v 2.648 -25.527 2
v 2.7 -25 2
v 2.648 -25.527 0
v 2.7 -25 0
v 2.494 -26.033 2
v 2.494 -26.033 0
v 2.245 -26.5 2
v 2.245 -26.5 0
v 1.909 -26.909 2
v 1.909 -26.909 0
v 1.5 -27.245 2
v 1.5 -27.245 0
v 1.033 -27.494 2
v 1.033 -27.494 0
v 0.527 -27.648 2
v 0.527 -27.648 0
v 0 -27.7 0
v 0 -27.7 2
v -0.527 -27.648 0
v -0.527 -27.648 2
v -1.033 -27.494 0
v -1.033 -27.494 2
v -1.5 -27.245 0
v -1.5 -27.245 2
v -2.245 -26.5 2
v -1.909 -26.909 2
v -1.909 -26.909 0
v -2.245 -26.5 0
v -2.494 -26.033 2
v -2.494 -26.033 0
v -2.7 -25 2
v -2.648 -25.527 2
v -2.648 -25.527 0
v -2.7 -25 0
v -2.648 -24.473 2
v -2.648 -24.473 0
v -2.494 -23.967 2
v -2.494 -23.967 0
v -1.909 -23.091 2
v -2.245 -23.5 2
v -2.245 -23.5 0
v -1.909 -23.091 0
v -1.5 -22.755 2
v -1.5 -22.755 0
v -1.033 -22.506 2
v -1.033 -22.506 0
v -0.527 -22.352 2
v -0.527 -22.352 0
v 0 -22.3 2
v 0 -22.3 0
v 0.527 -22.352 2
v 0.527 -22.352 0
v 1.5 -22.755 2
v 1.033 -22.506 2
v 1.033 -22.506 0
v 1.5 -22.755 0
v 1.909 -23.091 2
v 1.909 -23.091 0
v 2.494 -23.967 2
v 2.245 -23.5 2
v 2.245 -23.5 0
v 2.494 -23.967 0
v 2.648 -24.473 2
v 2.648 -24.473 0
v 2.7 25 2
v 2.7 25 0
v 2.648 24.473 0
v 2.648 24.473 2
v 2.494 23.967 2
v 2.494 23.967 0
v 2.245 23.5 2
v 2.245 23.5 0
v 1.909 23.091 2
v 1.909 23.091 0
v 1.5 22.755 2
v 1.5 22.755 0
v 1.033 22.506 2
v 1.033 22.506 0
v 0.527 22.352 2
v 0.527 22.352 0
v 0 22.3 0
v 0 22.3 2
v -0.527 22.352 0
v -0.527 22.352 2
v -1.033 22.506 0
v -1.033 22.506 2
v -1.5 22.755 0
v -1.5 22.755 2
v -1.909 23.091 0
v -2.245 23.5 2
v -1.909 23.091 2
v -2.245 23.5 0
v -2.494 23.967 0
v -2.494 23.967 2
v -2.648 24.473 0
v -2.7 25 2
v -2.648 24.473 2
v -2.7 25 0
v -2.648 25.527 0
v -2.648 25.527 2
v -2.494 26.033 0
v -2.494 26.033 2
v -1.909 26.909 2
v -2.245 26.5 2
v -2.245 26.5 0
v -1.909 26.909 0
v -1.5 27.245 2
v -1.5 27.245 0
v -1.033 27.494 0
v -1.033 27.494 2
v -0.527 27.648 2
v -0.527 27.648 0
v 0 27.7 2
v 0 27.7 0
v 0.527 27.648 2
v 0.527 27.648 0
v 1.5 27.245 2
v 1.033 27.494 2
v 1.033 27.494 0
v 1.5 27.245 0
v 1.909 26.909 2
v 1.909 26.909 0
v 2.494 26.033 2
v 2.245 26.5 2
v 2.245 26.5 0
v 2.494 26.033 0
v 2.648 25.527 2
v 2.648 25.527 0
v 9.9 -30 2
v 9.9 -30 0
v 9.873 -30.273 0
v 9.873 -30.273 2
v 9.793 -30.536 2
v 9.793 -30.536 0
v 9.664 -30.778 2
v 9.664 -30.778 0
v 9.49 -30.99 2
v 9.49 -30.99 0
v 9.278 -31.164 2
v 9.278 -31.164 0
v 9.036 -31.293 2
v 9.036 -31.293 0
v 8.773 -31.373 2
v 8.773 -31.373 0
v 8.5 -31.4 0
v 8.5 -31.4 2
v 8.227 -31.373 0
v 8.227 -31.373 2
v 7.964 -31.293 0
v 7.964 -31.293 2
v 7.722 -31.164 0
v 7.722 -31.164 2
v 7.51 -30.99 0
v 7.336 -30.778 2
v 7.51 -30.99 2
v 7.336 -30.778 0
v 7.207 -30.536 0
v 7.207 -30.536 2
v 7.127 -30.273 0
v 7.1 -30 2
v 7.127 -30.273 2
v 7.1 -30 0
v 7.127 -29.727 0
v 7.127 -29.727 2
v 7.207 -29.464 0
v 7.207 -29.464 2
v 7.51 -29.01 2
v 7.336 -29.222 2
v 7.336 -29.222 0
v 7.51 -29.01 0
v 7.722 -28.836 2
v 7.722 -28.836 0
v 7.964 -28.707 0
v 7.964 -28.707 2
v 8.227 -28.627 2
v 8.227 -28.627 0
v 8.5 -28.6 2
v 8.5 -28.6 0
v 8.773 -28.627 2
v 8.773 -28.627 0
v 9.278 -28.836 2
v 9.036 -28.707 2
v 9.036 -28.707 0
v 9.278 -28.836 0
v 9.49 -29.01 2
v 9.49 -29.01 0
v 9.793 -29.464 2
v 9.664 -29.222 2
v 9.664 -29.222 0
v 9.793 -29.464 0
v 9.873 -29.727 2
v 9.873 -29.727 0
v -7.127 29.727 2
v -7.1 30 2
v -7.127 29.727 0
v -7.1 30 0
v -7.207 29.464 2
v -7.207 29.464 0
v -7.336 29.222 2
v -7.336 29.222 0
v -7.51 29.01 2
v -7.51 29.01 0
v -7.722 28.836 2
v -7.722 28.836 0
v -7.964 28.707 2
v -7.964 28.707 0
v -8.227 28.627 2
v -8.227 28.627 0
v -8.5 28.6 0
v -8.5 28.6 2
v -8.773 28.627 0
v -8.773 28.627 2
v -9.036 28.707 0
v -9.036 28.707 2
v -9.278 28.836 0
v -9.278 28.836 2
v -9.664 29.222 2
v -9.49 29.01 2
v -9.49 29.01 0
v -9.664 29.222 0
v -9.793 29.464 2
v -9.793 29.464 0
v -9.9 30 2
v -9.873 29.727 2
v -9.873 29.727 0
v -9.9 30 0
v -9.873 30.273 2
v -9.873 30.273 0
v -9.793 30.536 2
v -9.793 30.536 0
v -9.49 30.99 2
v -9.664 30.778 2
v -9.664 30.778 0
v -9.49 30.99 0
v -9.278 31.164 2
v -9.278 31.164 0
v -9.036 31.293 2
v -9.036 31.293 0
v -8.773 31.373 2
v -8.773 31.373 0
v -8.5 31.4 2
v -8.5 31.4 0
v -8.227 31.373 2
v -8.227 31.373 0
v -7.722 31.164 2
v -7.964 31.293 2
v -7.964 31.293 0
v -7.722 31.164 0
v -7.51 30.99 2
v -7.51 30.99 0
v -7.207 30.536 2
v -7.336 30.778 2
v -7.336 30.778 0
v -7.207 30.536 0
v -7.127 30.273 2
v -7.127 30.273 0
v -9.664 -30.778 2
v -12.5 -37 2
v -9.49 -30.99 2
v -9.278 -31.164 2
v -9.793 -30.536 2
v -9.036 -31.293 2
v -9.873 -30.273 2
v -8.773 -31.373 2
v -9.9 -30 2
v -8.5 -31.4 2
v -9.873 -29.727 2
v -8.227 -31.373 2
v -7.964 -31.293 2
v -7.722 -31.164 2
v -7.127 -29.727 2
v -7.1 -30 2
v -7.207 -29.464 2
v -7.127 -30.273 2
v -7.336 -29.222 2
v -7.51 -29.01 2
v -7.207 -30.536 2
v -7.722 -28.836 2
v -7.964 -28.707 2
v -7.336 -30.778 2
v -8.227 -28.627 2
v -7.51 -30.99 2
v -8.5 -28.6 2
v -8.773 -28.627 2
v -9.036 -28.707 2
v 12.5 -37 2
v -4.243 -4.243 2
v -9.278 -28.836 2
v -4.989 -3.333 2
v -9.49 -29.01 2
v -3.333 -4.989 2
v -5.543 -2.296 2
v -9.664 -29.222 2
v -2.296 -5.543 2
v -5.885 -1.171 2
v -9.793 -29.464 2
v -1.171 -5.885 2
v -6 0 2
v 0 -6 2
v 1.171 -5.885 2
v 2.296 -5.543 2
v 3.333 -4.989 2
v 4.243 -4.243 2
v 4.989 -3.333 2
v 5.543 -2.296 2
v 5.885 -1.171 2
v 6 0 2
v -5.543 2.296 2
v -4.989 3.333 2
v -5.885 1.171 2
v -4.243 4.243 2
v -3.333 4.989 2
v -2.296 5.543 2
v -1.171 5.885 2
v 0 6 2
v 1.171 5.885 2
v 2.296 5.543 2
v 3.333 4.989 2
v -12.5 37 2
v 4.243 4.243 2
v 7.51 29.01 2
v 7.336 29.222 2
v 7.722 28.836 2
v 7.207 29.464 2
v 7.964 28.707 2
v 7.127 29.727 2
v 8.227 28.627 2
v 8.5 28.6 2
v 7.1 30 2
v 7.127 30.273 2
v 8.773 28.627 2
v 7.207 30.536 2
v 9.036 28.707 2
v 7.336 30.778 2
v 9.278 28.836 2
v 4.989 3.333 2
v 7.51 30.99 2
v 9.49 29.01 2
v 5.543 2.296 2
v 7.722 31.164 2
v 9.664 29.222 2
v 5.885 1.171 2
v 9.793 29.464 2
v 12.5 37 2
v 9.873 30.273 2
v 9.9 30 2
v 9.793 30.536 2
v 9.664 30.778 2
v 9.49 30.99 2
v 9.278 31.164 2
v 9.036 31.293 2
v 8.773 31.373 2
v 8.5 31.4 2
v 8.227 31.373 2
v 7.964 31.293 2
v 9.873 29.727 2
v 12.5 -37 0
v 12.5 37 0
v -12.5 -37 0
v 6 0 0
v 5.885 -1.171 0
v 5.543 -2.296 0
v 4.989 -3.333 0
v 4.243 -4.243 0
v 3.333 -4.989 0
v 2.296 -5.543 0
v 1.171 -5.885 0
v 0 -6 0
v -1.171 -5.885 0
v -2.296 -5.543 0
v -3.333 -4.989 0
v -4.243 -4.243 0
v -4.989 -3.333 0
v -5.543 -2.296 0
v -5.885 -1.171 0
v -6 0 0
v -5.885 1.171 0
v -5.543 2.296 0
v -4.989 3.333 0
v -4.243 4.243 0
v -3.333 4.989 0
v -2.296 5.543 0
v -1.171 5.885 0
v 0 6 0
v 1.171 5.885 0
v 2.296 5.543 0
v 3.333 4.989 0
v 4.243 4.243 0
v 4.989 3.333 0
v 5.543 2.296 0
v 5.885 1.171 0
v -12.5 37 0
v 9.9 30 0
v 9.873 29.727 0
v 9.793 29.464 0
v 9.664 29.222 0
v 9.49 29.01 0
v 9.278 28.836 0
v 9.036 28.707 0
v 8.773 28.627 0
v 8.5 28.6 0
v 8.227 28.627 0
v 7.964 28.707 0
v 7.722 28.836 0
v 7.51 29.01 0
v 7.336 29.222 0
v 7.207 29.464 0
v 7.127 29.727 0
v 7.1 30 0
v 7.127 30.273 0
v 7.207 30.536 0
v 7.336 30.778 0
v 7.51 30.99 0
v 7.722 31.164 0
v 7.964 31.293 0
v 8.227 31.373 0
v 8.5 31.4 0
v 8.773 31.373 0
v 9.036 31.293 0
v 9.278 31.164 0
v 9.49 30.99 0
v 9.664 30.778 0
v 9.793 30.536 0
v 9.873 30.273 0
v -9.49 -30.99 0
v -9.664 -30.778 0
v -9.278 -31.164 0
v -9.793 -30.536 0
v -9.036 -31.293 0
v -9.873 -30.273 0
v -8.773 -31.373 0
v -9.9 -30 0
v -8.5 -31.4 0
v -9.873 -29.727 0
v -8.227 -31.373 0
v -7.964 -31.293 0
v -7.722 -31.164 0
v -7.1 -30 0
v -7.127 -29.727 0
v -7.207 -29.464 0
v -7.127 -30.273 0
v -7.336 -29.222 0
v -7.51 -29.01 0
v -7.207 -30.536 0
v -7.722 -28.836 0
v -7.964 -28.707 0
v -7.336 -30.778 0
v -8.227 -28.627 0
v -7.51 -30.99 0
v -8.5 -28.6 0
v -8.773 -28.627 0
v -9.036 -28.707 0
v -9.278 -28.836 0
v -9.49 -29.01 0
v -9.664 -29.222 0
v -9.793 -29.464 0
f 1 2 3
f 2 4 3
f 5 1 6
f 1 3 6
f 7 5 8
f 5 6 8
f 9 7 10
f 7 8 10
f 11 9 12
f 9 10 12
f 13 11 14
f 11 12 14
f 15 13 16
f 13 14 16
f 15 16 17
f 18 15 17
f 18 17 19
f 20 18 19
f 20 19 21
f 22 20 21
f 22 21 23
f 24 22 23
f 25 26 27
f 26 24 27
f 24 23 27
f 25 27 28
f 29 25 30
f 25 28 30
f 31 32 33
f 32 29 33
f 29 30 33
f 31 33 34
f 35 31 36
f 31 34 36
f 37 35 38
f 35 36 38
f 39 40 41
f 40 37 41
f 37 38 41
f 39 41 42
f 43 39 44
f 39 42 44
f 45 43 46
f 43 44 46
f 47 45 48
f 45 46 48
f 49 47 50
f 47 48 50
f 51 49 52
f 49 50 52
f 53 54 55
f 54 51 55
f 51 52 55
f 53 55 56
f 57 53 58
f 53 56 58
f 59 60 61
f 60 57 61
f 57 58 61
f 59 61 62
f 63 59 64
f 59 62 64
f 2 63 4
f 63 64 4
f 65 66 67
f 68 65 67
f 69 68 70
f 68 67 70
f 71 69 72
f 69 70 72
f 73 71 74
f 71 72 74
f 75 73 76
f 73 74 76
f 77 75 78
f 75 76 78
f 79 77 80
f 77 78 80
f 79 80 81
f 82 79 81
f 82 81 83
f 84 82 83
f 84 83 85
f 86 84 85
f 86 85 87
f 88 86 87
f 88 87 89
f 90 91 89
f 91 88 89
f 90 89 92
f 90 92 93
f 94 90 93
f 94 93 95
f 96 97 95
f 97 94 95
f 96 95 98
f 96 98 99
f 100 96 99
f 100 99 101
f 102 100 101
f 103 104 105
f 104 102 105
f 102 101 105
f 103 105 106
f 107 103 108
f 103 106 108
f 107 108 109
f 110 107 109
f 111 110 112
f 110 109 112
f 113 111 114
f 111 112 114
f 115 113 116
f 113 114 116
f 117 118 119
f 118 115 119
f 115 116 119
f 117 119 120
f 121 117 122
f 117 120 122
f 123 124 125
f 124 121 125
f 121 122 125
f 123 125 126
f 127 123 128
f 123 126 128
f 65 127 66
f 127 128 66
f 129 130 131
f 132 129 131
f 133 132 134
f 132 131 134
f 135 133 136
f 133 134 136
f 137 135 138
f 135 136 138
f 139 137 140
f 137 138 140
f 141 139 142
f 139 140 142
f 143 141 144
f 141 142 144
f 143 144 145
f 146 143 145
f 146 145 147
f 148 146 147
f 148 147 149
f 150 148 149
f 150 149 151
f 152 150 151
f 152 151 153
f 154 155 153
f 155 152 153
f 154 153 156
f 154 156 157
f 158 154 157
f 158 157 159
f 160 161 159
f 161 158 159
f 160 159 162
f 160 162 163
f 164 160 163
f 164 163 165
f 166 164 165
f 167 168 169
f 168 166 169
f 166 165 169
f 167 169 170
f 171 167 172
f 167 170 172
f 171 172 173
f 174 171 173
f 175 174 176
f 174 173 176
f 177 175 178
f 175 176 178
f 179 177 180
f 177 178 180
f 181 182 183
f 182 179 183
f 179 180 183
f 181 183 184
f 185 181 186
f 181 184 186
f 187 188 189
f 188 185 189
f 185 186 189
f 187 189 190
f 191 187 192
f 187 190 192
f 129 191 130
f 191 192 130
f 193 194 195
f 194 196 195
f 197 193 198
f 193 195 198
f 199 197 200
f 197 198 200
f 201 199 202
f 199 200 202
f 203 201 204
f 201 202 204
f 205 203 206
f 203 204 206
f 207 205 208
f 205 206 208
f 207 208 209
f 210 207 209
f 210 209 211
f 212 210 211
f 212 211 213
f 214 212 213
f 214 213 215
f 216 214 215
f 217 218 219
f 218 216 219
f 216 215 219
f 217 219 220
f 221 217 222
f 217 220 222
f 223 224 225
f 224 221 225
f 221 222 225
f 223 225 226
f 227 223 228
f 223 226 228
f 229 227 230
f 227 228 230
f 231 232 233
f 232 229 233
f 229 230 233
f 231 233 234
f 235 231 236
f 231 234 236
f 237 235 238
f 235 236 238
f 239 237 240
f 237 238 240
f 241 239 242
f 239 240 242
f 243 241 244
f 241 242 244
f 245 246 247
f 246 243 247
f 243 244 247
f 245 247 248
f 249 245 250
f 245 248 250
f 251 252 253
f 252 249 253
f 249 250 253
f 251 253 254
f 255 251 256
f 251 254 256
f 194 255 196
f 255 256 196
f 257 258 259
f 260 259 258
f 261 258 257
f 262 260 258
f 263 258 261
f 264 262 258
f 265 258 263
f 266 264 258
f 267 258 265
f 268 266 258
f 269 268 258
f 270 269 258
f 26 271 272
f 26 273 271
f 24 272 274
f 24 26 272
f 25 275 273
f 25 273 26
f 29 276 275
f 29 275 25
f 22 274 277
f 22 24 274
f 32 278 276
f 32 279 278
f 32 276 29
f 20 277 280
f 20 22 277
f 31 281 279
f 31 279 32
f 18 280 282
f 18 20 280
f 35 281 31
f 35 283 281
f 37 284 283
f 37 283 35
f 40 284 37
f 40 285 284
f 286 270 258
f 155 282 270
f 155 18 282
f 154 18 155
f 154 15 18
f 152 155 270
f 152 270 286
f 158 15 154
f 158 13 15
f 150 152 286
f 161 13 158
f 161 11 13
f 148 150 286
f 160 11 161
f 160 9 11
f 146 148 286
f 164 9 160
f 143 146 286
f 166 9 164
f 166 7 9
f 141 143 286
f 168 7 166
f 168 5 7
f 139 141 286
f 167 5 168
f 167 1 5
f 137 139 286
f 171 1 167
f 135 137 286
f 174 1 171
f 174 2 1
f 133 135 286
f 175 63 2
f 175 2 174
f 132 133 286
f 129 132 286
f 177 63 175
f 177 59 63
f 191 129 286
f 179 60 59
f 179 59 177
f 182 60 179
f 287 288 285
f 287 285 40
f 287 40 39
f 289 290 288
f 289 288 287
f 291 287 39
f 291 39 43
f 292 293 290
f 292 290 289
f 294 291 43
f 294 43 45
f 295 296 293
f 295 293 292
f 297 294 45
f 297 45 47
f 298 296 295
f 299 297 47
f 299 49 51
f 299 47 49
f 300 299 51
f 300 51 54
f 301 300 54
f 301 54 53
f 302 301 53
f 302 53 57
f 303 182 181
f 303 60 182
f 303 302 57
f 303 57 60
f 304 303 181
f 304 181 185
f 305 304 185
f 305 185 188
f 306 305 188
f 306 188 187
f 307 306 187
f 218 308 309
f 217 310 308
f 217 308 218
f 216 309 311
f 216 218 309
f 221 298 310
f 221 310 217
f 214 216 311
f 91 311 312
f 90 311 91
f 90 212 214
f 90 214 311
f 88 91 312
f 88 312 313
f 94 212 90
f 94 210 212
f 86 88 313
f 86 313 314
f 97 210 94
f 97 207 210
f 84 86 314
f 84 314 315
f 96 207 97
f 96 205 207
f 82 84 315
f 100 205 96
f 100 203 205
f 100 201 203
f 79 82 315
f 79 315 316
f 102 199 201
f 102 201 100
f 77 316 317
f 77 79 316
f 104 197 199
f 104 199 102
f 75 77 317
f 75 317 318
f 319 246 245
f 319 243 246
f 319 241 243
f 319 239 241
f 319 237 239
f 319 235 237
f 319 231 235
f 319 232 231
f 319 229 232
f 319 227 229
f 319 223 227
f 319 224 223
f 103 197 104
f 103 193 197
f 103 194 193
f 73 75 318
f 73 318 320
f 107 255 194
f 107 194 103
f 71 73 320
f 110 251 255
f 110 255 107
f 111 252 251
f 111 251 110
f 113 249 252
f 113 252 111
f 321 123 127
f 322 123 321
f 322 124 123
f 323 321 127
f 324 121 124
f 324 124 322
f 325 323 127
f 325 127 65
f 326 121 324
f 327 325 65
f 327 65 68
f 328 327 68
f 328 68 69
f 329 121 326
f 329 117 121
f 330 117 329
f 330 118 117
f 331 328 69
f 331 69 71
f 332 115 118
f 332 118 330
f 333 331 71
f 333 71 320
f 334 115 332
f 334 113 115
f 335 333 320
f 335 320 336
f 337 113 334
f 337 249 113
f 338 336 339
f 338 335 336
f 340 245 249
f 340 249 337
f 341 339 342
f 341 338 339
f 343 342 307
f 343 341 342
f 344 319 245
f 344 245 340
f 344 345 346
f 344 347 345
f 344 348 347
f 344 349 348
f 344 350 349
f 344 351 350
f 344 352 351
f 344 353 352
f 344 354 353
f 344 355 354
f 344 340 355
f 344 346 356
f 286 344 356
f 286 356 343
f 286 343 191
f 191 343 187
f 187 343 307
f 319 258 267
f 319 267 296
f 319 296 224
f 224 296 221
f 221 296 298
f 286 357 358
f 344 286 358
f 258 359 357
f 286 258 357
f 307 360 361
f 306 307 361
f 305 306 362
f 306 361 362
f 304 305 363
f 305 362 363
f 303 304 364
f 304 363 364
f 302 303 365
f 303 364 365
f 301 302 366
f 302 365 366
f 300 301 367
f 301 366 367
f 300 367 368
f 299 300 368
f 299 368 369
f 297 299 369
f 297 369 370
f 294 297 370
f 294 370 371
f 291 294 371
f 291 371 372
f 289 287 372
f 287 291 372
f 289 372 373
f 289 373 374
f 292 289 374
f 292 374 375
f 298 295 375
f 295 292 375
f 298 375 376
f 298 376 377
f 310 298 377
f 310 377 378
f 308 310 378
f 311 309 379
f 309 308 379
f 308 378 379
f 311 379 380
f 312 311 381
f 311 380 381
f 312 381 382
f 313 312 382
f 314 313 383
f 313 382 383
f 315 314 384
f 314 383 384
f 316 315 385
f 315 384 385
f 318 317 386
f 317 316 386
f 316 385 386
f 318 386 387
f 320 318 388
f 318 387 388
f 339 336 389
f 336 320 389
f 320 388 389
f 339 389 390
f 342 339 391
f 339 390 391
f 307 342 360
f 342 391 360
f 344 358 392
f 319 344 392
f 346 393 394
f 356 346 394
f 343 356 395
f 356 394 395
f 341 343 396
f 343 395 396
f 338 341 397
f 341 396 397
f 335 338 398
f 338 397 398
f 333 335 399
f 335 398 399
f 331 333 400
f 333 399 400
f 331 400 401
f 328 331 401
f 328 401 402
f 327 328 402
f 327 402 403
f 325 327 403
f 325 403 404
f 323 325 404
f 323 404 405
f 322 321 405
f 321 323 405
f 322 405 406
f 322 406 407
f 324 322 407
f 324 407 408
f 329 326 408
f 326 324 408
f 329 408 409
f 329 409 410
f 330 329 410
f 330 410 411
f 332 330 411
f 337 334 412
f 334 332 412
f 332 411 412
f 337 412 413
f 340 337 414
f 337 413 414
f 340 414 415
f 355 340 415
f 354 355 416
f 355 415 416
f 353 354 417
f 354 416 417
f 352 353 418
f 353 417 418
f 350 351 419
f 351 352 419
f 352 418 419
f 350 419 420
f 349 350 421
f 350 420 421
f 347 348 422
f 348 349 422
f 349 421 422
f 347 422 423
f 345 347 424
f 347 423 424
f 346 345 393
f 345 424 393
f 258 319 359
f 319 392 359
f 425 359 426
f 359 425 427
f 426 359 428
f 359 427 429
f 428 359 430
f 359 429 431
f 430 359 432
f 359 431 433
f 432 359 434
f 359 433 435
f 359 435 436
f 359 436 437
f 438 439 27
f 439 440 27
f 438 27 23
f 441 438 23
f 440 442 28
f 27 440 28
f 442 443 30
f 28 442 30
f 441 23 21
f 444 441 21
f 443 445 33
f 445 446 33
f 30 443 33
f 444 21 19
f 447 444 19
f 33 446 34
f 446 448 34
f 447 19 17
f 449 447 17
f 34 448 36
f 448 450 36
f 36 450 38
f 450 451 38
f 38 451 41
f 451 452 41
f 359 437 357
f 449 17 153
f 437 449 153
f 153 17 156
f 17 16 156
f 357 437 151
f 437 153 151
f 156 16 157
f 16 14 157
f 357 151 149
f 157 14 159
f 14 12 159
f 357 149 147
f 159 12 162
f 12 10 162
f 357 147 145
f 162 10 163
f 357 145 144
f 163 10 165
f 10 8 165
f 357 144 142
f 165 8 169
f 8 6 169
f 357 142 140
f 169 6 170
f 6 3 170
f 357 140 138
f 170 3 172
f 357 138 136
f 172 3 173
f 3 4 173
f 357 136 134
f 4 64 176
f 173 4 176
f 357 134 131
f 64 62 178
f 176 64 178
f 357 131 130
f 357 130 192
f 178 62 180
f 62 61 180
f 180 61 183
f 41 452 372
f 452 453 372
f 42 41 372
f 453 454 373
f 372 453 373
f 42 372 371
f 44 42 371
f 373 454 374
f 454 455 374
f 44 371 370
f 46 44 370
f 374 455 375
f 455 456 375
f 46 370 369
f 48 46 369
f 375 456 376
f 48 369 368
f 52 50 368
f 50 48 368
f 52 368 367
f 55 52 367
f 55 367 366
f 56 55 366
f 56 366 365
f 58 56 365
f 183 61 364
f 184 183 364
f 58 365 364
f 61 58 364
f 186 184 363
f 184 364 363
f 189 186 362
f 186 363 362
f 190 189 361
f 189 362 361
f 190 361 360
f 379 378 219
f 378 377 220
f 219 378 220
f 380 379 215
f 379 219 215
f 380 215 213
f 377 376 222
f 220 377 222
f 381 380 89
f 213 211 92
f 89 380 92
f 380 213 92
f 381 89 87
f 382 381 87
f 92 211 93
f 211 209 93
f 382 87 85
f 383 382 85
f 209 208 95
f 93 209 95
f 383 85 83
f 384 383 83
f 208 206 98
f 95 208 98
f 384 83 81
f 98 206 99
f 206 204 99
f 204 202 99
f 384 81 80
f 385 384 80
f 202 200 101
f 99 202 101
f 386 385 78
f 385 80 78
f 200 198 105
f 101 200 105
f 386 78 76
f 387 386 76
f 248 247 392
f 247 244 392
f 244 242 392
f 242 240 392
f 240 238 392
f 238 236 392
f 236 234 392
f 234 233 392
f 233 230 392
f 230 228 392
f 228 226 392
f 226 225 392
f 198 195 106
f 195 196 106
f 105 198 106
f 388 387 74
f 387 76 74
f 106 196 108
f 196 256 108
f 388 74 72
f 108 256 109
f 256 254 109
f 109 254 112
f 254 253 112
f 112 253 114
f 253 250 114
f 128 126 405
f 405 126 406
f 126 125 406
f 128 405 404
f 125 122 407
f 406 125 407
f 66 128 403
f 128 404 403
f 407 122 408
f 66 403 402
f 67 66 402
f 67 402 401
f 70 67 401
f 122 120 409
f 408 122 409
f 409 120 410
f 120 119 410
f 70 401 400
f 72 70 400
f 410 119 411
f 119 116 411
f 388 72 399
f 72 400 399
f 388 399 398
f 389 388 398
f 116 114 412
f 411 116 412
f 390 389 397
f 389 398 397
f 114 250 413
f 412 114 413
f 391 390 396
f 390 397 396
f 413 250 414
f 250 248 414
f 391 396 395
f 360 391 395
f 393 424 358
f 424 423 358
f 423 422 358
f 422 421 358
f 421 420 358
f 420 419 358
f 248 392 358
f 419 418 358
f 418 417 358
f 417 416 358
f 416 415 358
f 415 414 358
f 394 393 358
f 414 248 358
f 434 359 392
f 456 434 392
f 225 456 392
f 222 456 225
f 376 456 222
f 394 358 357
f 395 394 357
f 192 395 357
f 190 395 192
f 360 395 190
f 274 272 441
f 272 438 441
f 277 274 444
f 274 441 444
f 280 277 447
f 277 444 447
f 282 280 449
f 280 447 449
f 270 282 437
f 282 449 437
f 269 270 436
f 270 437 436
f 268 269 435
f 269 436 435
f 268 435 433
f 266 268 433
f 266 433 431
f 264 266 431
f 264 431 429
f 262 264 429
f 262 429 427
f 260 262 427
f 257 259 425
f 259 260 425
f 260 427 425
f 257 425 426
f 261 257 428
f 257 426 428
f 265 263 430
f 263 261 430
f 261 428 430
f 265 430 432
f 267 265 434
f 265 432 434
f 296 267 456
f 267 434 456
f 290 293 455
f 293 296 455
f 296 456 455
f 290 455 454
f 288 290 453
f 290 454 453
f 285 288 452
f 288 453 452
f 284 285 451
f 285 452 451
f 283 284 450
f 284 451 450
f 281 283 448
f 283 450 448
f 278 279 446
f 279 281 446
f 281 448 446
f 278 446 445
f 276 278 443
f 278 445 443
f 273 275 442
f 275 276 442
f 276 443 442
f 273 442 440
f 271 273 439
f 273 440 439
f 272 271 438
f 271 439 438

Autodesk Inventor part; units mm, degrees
ref_plane "YZ Plane" through (0, 0, 0) normal (1, 0, 0) x (0, 1, 0)
ref_plane "XZ Plane" through (0, 0, 0) normal (0, 1, 0) x (-1, 0, 0)
ref_plane "XY Plane" through (0, 0, 0) normal (0, 0, 1) x (1, 0, 0)
ref_plane "Arbeitsebene1" through (0, 0, 0) normal (0, 0, 1) x (1, 0, 0)
sketch "Skizze1" plane through (0, 0, 0) normal (0, 0, 1) x (1, 0, 0)
  circle A0 centre (0, -25) radius 2.5 projected
  circle A1 centre (0, 25) radius 2.5 projected
  line L0 (12.5, -37) -> (12.5, 37) projected
  line L1 (12.5, 37) -> (-12.5, 37) projected
  line L2 (-12.5, 37) -> (-12.5, -37) projected
  line L3 (-12.5, -37) -> (12.5, -37) projected
  circle A2 centre (8.5, -30) radius 1.4 projected
  circle A3 centre (-8.5, -30) radius 1.4 projected
  circle A4 centre (-8.5, 30) radius 1.4 projected
  circle A5 centre (8.5, 30) radius 1.4 projected
  circle A6 centre (0, 0) radius 6
  circle A7 centre (0, 25) radius 2.7
  circle A8 centre (0, -25) radius 2.7
  line L4 (-9.25, 9.25) -> (9.25, 9.25) projected
  line L5 (9.25, 9.25) -> (9.25, -9.25) projected
  line L6 (9.25, -9.25) -> (-9.25, -9.25) projected
  line L7 (-9.25, -9.25) -> (-9.25, 9.25) projected
  point P0 (0.75, -9.25)
  point P1 (-0.75, -9.25)
  point P2 (-0.75, 9.25)
  point P3 (0.75, 9.25)
  point P4 (0.75, 5.9529)
  point P5 (-0.75, 5.9529)
  point P6 (0.75, -5.9529)
  point P7 (-0.75, -5.9529)
  dimension "d0" = 12
  dimension "d4" = 0.2
  dimension "d5" = 0.2
extrude "Extrusion1" add sketch "Skizze1" along normal blind 2 contours L3 L2 L1 L0 | L4 L5 L6 L7
sketch "Skizze2" plane through (0, 0, 0) normal (0, 0, -1) x (-1, 0, 0)
  line L0 (-9, -9) -> (-9, 9) projected
  line L1 (9, -9) -> (-9, -9) projected
  line L2 (9, 9) -> (9, -9) projected
  line L3 (-9, 9) -> (9, 9) projected
  line L4 (9.5, -9.5) -> (-9.5, -9.5)
  line L5 (-9.5, -9.5) -> (-9.5, 9.5)
  line L6 (-9.5, 9.5) -> (9.5, 9.5)
  line L7 (9.5, 9.5) -> (9.5, -9.5)
  point P0 (0, 0)
  dimension "d6" = 0.5
properties part number "40_microfluidic_chip_lightsheet_layer2_v0"
